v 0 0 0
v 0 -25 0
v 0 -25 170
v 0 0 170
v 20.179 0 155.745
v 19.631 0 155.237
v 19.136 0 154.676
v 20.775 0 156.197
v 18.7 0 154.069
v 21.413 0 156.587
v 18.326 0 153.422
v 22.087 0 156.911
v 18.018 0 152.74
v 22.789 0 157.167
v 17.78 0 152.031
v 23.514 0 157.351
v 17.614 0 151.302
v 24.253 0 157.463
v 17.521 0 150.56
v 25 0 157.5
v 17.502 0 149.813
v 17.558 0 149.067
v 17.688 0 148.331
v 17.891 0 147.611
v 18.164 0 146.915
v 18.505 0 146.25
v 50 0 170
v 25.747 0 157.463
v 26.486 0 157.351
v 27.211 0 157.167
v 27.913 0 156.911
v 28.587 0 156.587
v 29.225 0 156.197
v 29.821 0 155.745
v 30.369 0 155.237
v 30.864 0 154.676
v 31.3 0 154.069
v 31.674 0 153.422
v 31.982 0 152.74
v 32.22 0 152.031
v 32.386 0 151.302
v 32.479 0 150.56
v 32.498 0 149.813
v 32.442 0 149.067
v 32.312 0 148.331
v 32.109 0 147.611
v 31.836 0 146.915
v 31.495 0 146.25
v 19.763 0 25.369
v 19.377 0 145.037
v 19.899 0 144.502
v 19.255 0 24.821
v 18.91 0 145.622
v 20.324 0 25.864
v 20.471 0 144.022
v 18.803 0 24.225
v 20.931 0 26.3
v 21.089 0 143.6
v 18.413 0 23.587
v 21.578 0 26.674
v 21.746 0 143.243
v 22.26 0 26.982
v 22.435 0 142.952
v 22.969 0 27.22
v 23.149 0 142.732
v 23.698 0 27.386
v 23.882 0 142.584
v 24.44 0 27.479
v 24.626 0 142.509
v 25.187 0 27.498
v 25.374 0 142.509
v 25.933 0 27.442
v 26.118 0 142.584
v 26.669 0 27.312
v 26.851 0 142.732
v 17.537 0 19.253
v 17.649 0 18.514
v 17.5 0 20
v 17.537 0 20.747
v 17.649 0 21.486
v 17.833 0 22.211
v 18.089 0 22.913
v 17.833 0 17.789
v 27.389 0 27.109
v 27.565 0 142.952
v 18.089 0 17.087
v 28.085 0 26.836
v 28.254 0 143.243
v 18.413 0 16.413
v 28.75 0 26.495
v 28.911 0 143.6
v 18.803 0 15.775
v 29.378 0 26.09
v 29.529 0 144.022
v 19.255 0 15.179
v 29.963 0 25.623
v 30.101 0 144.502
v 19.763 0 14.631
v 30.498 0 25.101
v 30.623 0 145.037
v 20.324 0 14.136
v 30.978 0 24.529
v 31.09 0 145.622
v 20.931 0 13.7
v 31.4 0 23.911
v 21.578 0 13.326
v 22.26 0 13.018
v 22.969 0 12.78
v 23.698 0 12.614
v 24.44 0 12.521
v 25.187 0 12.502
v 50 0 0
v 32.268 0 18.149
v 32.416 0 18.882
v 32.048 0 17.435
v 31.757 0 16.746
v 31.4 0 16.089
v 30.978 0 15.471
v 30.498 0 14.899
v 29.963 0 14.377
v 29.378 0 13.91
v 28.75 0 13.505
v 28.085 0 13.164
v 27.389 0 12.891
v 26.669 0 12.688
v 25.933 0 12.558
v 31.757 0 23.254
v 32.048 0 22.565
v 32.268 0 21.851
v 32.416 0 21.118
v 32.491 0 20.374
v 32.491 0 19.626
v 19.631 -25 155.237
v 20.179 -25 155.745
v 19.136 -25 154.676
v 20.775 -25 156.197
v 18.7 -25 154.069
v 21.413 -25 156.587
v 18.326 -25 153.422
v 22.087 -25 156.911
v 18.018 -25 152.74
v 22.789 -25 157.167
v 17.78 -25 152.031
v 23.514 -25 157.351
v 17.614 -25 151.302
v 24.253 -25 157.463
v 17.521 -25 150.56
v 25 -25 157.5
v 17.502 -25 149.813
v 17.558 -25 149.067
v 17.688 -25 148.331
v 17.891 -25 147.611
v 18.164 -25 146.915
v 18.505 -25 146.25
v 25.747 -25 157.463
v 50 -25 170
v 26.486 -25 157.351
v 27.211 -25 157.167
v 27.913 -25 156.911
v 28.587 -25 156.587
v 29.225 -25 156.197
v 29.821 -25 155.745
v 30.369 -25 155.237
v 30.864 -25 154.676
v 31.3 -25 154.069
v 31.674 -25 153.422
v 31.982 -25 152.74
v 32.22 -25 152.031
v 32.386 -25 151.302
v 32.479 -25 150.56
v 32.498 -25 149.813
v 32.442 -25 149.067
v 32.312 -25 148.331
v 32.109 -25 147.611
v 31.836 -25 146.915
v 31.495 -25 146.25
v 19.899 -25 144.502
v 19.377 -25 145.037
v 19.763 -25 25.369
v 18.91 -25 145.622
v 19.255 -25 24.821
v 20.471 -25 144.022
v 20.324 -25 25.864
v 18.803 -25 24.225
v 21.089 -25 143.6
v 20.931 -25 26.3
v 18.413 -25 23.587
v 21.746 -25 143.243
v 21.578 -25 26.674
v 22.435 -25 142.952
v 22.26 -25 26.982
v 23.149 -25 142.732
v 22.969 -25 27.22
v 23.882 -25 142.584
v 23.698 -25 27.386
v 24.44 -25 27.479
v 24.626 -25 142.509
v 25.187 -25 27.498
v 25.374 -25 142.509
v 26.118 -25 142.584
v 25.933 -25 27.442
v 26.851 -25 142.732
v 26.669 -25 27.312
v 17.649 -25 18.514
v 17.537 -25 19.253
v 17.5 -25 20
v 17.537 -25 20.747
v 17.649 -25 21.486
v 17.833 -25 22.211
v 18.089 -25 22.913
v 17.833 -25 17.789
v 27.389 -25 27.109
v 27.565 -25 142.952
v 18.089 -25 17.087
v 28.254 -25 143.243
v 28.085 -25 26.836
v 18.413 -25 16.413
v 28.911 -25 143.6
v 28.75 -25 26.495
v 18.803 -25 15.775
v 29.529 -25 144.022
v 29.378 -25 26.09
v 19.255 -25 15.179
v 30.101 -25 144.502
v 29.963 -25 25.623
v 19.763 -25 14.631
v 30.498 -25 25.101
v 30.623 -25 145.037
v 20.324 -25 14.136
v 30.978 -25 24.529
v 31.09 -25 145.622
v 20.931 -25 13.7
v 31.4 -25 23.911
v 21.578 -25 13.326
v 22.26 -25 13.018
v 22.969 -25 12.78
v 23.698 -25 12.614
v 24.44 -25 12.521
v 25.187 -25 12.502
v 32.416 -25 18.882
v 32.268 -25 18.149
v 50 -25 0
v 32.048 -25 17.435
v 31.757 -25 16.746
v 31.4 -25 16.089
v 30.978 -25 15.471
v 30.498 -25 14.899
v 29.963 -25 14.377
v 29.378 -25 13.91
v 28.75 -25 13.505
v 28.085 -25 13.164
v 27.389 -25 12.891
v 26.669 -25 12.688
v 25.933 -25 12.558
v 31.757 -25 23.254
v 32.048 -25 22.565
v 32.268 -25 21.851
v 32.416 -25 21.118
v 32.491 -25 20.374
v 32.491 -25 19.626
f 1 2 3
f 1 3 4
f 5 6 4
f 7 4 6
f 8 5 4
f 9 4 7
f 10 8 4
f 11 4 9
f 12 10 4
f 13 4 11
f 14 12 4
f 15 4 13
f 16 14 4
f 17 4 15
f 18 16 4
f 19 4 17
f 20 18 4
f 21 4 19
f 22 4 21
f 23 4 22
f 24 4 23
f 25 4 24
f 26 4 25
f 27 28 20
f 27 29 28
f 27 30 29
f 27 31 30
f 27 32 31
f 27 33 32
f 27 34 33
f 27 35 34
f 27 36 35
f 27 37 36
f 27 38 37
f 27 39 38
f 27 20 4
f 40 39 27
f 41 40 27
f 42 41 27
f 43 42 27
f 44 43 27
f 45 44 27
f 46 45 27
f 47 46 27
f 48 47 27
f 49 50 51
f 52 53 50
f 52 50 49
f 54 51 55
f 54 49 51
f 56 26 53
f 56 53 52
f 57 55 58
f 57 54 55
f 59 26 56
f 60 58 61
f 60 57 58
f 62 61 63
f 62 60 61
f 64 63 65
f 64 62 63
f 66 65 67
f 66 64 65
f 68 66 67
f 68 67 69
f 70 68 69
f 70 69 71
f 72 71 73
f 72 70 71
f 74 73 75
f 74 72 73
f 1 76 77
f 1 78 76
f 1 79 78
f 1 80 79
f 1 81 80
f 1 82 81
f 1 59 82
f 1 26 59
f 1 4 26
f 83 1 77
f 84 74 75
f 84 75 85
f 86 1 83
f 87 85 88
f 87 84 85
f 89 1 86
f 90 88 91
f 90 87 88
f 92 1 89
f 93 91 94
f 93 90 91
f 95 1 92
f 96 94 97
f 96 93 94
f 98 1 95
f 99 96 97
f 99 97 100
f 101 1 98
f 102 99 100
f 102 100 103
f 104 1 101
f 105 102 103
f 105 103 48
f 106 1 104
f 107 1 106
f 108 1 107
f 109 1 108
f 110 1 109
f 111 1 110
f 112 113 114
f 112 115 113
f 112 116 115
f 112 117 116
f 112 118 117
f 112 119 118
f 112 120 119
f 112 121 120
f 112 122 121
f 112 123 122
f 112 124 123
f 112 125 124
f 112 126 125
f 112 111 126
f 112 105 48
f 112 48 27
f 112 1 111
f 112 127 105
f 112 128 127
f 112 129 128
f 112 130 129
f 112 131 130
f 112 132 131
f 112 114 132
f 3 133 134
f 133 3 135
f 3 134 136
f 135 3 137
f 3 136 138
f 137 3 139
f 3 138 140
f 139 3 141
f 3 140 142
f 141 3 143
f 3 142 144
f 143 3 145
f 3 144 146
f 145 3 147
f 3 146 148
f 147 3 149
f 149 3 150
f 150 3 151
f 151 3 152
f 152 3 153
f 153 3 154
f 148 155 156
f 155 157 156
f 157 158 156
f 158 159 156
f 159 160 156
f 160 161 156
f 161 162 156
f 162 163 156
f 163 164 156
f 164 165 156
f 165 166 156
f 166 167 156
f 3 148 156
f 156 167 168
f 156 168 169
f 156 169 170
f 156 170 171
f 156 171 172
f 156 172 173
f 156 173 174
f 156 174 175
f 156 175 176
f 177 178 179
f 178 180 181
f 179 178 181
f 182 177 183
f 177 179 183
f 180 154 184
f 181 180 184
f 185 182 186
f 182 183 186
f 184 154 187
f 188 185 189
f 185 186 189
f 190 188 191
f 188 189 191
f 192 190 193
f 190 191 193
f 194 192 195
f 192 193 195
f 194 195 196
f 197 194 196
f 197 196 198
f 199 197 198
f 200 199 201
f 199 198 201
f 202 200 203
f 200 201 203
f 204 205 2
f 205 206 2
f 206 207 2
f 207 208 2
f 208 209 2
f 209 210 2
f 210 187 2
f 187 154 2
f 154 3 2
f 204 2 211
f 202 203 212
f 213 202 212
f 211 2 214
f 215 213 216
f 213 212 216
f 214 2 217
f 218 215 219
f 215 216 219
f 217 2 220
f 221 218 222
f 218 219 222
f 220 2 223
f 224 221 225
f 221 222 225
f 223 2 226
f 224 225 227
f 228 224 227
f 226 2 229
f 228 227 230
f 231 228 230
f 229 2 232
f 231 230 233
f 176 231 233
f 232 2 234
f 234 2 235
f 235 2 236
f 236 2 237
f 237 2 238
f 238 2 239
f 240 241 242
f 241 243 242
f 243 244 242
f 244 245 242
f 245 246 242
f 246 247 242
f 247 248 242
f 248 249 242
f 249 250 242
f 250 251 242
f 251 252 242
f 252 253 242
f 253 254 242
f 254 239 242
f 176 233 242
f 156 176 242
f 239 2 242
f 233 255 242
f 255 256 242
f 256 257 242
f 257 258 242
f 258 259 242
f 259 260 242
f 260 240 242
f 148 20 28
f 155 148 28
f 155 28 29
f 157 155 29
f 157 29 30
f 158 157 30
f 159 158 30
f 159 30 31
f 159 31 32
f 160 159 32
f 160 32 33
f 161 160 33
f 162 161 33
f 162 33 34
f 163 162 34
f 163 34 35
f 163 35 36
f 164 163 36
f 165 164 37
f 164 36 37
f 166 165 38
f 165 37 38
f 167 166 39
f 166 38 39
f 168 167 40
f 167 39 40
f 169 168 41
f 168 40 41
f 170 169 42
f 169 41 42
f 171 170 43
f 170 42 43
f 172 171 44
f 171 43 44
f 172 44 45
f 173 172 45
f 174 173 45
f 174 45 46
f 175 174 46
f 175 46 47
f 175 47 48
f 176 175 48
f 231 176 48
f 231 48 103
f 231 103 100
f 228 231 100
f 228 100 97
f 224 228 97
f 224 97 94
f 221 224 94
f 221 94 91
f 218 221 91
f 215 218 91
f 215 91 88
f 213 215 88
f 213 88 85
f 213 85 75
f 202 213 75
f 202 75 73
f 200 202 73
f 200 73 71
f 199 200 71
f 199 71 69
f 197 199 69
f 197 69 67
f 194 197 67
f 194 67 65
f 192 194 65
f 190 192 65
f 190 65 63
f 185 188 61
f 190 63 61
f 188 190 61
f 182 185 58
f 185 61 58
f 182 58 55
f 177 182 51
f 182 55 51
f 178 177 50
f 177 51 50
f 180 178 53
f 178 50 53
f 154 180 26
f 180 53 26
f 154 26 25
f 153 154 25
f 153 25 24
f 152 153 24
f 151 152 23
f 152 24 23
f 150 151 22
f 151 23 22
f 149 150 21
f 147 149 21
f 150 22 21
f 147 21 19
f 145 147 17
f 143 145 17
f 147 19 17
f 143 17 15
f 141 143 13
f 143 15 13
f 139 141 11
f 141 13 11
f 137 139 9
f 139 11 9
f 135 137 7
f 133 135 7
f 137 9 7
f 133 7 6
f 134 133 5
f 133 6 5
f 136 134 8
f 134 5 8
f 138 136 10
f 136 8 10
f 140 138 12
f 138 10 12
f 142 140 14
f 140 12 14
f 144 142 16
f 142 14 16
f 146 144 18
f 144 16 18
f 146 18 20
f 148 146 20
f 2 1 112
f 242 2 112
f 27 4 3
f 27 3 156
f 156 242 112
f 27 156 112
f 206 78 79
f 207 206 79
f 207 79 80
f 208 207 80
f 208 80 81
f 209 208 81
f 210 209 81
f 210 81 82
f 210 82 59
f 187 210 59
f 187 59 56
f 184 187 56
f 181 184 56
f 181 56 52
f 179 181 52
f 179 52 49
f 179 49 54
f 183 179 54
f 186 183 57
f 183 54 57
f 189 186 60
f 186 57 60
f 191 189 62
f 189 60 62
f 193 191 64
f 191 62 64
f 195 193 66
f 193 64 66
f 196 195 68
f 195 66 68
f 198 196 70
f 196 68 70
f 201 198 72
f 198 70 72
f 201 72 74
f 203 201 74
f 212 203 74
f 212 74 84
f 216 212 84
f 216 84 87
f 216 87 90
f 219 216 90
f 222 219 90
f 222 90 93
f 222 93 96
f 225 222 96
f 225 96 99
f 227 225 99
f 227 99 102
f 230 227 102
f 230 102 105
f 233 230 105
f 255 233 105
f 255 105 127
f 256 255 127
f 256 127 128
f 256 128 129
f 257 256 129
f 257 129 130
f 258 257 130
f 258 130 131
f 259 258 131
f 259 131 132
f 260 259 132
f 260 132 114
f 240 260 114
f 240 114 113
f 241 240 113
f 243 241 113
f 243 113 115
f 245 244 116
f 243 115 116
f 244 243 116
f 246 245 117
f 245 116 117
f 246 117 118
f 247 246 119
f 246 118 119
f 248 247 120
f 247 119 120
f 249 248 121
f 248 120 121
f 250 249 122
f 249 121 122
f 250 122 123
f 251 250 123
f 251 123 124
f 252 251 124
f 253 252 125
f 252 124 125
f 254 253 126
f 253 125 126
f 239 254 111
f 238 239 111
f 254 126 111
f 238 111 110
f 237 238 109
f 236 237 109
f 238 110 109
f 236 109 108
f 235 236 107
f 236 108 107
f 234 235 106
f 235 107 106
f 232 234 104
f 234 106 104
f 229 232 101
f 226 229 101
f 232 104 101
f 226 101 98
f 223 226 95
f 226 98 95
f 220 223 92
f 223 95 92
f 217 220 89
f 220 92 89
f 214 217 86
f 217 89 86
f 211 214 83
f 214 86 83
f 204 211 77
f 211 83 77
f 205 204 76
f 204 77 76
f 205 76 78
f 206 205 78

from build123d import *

# Parameters (mm, degrees)
SKETCH1_W           = 50
SKETCH1_H           = 25
BOSS_EXTRUDE1_DEPTH = 170
SKETCH2_R           = 7.5
CUT_EXTRUDE1_DEPTH  = 179.955301682
SKETCH3_R           = 7.5
CUT_EXTRUDE2_DEPTH  = 170


with BuildPart() as part:
    # Sketch1 → Boss-Extrude1 (new body)
    with BuildSketch(Plane.XY):
        with Locations((25, -12.5)):
            Rectangle(SKETCH1_W, SKETCH1_H)
    extrude(amount=BOSS_EXTRUDE1_DEPTH)

    # Sketch2 → Cut-Extrude1 (cut, through all)
    with BuildSketch(Plane(origin=(0, 0, 0), x_dir=(1, 0, 0), z_dir=(0, 1, 0))):
        with Locations(Location((25, -20, 0), (0, 0, 180))):
            Circle(SKETCH2_R)
    extrude(amount=-CUT_EXTRUDE1_DEPTH, mode=Mode.SUBTRACT)

    # Sketch3 → Cut-Extrude2 (cut)
    with BuildSketch(Plane(origin=(0, 0, 0), x_dir=(1, 0, 0), z_dir=(0, 1, 0))):
        with Locations(Location((25, -150, 0), (0, 0, 270))):
            Circle(SKETCH3_R)
    extrude(amount=-CUT_EXTRUDE2_DEPTH, mode=Mode.SUBTRACT)


solid = part.part
